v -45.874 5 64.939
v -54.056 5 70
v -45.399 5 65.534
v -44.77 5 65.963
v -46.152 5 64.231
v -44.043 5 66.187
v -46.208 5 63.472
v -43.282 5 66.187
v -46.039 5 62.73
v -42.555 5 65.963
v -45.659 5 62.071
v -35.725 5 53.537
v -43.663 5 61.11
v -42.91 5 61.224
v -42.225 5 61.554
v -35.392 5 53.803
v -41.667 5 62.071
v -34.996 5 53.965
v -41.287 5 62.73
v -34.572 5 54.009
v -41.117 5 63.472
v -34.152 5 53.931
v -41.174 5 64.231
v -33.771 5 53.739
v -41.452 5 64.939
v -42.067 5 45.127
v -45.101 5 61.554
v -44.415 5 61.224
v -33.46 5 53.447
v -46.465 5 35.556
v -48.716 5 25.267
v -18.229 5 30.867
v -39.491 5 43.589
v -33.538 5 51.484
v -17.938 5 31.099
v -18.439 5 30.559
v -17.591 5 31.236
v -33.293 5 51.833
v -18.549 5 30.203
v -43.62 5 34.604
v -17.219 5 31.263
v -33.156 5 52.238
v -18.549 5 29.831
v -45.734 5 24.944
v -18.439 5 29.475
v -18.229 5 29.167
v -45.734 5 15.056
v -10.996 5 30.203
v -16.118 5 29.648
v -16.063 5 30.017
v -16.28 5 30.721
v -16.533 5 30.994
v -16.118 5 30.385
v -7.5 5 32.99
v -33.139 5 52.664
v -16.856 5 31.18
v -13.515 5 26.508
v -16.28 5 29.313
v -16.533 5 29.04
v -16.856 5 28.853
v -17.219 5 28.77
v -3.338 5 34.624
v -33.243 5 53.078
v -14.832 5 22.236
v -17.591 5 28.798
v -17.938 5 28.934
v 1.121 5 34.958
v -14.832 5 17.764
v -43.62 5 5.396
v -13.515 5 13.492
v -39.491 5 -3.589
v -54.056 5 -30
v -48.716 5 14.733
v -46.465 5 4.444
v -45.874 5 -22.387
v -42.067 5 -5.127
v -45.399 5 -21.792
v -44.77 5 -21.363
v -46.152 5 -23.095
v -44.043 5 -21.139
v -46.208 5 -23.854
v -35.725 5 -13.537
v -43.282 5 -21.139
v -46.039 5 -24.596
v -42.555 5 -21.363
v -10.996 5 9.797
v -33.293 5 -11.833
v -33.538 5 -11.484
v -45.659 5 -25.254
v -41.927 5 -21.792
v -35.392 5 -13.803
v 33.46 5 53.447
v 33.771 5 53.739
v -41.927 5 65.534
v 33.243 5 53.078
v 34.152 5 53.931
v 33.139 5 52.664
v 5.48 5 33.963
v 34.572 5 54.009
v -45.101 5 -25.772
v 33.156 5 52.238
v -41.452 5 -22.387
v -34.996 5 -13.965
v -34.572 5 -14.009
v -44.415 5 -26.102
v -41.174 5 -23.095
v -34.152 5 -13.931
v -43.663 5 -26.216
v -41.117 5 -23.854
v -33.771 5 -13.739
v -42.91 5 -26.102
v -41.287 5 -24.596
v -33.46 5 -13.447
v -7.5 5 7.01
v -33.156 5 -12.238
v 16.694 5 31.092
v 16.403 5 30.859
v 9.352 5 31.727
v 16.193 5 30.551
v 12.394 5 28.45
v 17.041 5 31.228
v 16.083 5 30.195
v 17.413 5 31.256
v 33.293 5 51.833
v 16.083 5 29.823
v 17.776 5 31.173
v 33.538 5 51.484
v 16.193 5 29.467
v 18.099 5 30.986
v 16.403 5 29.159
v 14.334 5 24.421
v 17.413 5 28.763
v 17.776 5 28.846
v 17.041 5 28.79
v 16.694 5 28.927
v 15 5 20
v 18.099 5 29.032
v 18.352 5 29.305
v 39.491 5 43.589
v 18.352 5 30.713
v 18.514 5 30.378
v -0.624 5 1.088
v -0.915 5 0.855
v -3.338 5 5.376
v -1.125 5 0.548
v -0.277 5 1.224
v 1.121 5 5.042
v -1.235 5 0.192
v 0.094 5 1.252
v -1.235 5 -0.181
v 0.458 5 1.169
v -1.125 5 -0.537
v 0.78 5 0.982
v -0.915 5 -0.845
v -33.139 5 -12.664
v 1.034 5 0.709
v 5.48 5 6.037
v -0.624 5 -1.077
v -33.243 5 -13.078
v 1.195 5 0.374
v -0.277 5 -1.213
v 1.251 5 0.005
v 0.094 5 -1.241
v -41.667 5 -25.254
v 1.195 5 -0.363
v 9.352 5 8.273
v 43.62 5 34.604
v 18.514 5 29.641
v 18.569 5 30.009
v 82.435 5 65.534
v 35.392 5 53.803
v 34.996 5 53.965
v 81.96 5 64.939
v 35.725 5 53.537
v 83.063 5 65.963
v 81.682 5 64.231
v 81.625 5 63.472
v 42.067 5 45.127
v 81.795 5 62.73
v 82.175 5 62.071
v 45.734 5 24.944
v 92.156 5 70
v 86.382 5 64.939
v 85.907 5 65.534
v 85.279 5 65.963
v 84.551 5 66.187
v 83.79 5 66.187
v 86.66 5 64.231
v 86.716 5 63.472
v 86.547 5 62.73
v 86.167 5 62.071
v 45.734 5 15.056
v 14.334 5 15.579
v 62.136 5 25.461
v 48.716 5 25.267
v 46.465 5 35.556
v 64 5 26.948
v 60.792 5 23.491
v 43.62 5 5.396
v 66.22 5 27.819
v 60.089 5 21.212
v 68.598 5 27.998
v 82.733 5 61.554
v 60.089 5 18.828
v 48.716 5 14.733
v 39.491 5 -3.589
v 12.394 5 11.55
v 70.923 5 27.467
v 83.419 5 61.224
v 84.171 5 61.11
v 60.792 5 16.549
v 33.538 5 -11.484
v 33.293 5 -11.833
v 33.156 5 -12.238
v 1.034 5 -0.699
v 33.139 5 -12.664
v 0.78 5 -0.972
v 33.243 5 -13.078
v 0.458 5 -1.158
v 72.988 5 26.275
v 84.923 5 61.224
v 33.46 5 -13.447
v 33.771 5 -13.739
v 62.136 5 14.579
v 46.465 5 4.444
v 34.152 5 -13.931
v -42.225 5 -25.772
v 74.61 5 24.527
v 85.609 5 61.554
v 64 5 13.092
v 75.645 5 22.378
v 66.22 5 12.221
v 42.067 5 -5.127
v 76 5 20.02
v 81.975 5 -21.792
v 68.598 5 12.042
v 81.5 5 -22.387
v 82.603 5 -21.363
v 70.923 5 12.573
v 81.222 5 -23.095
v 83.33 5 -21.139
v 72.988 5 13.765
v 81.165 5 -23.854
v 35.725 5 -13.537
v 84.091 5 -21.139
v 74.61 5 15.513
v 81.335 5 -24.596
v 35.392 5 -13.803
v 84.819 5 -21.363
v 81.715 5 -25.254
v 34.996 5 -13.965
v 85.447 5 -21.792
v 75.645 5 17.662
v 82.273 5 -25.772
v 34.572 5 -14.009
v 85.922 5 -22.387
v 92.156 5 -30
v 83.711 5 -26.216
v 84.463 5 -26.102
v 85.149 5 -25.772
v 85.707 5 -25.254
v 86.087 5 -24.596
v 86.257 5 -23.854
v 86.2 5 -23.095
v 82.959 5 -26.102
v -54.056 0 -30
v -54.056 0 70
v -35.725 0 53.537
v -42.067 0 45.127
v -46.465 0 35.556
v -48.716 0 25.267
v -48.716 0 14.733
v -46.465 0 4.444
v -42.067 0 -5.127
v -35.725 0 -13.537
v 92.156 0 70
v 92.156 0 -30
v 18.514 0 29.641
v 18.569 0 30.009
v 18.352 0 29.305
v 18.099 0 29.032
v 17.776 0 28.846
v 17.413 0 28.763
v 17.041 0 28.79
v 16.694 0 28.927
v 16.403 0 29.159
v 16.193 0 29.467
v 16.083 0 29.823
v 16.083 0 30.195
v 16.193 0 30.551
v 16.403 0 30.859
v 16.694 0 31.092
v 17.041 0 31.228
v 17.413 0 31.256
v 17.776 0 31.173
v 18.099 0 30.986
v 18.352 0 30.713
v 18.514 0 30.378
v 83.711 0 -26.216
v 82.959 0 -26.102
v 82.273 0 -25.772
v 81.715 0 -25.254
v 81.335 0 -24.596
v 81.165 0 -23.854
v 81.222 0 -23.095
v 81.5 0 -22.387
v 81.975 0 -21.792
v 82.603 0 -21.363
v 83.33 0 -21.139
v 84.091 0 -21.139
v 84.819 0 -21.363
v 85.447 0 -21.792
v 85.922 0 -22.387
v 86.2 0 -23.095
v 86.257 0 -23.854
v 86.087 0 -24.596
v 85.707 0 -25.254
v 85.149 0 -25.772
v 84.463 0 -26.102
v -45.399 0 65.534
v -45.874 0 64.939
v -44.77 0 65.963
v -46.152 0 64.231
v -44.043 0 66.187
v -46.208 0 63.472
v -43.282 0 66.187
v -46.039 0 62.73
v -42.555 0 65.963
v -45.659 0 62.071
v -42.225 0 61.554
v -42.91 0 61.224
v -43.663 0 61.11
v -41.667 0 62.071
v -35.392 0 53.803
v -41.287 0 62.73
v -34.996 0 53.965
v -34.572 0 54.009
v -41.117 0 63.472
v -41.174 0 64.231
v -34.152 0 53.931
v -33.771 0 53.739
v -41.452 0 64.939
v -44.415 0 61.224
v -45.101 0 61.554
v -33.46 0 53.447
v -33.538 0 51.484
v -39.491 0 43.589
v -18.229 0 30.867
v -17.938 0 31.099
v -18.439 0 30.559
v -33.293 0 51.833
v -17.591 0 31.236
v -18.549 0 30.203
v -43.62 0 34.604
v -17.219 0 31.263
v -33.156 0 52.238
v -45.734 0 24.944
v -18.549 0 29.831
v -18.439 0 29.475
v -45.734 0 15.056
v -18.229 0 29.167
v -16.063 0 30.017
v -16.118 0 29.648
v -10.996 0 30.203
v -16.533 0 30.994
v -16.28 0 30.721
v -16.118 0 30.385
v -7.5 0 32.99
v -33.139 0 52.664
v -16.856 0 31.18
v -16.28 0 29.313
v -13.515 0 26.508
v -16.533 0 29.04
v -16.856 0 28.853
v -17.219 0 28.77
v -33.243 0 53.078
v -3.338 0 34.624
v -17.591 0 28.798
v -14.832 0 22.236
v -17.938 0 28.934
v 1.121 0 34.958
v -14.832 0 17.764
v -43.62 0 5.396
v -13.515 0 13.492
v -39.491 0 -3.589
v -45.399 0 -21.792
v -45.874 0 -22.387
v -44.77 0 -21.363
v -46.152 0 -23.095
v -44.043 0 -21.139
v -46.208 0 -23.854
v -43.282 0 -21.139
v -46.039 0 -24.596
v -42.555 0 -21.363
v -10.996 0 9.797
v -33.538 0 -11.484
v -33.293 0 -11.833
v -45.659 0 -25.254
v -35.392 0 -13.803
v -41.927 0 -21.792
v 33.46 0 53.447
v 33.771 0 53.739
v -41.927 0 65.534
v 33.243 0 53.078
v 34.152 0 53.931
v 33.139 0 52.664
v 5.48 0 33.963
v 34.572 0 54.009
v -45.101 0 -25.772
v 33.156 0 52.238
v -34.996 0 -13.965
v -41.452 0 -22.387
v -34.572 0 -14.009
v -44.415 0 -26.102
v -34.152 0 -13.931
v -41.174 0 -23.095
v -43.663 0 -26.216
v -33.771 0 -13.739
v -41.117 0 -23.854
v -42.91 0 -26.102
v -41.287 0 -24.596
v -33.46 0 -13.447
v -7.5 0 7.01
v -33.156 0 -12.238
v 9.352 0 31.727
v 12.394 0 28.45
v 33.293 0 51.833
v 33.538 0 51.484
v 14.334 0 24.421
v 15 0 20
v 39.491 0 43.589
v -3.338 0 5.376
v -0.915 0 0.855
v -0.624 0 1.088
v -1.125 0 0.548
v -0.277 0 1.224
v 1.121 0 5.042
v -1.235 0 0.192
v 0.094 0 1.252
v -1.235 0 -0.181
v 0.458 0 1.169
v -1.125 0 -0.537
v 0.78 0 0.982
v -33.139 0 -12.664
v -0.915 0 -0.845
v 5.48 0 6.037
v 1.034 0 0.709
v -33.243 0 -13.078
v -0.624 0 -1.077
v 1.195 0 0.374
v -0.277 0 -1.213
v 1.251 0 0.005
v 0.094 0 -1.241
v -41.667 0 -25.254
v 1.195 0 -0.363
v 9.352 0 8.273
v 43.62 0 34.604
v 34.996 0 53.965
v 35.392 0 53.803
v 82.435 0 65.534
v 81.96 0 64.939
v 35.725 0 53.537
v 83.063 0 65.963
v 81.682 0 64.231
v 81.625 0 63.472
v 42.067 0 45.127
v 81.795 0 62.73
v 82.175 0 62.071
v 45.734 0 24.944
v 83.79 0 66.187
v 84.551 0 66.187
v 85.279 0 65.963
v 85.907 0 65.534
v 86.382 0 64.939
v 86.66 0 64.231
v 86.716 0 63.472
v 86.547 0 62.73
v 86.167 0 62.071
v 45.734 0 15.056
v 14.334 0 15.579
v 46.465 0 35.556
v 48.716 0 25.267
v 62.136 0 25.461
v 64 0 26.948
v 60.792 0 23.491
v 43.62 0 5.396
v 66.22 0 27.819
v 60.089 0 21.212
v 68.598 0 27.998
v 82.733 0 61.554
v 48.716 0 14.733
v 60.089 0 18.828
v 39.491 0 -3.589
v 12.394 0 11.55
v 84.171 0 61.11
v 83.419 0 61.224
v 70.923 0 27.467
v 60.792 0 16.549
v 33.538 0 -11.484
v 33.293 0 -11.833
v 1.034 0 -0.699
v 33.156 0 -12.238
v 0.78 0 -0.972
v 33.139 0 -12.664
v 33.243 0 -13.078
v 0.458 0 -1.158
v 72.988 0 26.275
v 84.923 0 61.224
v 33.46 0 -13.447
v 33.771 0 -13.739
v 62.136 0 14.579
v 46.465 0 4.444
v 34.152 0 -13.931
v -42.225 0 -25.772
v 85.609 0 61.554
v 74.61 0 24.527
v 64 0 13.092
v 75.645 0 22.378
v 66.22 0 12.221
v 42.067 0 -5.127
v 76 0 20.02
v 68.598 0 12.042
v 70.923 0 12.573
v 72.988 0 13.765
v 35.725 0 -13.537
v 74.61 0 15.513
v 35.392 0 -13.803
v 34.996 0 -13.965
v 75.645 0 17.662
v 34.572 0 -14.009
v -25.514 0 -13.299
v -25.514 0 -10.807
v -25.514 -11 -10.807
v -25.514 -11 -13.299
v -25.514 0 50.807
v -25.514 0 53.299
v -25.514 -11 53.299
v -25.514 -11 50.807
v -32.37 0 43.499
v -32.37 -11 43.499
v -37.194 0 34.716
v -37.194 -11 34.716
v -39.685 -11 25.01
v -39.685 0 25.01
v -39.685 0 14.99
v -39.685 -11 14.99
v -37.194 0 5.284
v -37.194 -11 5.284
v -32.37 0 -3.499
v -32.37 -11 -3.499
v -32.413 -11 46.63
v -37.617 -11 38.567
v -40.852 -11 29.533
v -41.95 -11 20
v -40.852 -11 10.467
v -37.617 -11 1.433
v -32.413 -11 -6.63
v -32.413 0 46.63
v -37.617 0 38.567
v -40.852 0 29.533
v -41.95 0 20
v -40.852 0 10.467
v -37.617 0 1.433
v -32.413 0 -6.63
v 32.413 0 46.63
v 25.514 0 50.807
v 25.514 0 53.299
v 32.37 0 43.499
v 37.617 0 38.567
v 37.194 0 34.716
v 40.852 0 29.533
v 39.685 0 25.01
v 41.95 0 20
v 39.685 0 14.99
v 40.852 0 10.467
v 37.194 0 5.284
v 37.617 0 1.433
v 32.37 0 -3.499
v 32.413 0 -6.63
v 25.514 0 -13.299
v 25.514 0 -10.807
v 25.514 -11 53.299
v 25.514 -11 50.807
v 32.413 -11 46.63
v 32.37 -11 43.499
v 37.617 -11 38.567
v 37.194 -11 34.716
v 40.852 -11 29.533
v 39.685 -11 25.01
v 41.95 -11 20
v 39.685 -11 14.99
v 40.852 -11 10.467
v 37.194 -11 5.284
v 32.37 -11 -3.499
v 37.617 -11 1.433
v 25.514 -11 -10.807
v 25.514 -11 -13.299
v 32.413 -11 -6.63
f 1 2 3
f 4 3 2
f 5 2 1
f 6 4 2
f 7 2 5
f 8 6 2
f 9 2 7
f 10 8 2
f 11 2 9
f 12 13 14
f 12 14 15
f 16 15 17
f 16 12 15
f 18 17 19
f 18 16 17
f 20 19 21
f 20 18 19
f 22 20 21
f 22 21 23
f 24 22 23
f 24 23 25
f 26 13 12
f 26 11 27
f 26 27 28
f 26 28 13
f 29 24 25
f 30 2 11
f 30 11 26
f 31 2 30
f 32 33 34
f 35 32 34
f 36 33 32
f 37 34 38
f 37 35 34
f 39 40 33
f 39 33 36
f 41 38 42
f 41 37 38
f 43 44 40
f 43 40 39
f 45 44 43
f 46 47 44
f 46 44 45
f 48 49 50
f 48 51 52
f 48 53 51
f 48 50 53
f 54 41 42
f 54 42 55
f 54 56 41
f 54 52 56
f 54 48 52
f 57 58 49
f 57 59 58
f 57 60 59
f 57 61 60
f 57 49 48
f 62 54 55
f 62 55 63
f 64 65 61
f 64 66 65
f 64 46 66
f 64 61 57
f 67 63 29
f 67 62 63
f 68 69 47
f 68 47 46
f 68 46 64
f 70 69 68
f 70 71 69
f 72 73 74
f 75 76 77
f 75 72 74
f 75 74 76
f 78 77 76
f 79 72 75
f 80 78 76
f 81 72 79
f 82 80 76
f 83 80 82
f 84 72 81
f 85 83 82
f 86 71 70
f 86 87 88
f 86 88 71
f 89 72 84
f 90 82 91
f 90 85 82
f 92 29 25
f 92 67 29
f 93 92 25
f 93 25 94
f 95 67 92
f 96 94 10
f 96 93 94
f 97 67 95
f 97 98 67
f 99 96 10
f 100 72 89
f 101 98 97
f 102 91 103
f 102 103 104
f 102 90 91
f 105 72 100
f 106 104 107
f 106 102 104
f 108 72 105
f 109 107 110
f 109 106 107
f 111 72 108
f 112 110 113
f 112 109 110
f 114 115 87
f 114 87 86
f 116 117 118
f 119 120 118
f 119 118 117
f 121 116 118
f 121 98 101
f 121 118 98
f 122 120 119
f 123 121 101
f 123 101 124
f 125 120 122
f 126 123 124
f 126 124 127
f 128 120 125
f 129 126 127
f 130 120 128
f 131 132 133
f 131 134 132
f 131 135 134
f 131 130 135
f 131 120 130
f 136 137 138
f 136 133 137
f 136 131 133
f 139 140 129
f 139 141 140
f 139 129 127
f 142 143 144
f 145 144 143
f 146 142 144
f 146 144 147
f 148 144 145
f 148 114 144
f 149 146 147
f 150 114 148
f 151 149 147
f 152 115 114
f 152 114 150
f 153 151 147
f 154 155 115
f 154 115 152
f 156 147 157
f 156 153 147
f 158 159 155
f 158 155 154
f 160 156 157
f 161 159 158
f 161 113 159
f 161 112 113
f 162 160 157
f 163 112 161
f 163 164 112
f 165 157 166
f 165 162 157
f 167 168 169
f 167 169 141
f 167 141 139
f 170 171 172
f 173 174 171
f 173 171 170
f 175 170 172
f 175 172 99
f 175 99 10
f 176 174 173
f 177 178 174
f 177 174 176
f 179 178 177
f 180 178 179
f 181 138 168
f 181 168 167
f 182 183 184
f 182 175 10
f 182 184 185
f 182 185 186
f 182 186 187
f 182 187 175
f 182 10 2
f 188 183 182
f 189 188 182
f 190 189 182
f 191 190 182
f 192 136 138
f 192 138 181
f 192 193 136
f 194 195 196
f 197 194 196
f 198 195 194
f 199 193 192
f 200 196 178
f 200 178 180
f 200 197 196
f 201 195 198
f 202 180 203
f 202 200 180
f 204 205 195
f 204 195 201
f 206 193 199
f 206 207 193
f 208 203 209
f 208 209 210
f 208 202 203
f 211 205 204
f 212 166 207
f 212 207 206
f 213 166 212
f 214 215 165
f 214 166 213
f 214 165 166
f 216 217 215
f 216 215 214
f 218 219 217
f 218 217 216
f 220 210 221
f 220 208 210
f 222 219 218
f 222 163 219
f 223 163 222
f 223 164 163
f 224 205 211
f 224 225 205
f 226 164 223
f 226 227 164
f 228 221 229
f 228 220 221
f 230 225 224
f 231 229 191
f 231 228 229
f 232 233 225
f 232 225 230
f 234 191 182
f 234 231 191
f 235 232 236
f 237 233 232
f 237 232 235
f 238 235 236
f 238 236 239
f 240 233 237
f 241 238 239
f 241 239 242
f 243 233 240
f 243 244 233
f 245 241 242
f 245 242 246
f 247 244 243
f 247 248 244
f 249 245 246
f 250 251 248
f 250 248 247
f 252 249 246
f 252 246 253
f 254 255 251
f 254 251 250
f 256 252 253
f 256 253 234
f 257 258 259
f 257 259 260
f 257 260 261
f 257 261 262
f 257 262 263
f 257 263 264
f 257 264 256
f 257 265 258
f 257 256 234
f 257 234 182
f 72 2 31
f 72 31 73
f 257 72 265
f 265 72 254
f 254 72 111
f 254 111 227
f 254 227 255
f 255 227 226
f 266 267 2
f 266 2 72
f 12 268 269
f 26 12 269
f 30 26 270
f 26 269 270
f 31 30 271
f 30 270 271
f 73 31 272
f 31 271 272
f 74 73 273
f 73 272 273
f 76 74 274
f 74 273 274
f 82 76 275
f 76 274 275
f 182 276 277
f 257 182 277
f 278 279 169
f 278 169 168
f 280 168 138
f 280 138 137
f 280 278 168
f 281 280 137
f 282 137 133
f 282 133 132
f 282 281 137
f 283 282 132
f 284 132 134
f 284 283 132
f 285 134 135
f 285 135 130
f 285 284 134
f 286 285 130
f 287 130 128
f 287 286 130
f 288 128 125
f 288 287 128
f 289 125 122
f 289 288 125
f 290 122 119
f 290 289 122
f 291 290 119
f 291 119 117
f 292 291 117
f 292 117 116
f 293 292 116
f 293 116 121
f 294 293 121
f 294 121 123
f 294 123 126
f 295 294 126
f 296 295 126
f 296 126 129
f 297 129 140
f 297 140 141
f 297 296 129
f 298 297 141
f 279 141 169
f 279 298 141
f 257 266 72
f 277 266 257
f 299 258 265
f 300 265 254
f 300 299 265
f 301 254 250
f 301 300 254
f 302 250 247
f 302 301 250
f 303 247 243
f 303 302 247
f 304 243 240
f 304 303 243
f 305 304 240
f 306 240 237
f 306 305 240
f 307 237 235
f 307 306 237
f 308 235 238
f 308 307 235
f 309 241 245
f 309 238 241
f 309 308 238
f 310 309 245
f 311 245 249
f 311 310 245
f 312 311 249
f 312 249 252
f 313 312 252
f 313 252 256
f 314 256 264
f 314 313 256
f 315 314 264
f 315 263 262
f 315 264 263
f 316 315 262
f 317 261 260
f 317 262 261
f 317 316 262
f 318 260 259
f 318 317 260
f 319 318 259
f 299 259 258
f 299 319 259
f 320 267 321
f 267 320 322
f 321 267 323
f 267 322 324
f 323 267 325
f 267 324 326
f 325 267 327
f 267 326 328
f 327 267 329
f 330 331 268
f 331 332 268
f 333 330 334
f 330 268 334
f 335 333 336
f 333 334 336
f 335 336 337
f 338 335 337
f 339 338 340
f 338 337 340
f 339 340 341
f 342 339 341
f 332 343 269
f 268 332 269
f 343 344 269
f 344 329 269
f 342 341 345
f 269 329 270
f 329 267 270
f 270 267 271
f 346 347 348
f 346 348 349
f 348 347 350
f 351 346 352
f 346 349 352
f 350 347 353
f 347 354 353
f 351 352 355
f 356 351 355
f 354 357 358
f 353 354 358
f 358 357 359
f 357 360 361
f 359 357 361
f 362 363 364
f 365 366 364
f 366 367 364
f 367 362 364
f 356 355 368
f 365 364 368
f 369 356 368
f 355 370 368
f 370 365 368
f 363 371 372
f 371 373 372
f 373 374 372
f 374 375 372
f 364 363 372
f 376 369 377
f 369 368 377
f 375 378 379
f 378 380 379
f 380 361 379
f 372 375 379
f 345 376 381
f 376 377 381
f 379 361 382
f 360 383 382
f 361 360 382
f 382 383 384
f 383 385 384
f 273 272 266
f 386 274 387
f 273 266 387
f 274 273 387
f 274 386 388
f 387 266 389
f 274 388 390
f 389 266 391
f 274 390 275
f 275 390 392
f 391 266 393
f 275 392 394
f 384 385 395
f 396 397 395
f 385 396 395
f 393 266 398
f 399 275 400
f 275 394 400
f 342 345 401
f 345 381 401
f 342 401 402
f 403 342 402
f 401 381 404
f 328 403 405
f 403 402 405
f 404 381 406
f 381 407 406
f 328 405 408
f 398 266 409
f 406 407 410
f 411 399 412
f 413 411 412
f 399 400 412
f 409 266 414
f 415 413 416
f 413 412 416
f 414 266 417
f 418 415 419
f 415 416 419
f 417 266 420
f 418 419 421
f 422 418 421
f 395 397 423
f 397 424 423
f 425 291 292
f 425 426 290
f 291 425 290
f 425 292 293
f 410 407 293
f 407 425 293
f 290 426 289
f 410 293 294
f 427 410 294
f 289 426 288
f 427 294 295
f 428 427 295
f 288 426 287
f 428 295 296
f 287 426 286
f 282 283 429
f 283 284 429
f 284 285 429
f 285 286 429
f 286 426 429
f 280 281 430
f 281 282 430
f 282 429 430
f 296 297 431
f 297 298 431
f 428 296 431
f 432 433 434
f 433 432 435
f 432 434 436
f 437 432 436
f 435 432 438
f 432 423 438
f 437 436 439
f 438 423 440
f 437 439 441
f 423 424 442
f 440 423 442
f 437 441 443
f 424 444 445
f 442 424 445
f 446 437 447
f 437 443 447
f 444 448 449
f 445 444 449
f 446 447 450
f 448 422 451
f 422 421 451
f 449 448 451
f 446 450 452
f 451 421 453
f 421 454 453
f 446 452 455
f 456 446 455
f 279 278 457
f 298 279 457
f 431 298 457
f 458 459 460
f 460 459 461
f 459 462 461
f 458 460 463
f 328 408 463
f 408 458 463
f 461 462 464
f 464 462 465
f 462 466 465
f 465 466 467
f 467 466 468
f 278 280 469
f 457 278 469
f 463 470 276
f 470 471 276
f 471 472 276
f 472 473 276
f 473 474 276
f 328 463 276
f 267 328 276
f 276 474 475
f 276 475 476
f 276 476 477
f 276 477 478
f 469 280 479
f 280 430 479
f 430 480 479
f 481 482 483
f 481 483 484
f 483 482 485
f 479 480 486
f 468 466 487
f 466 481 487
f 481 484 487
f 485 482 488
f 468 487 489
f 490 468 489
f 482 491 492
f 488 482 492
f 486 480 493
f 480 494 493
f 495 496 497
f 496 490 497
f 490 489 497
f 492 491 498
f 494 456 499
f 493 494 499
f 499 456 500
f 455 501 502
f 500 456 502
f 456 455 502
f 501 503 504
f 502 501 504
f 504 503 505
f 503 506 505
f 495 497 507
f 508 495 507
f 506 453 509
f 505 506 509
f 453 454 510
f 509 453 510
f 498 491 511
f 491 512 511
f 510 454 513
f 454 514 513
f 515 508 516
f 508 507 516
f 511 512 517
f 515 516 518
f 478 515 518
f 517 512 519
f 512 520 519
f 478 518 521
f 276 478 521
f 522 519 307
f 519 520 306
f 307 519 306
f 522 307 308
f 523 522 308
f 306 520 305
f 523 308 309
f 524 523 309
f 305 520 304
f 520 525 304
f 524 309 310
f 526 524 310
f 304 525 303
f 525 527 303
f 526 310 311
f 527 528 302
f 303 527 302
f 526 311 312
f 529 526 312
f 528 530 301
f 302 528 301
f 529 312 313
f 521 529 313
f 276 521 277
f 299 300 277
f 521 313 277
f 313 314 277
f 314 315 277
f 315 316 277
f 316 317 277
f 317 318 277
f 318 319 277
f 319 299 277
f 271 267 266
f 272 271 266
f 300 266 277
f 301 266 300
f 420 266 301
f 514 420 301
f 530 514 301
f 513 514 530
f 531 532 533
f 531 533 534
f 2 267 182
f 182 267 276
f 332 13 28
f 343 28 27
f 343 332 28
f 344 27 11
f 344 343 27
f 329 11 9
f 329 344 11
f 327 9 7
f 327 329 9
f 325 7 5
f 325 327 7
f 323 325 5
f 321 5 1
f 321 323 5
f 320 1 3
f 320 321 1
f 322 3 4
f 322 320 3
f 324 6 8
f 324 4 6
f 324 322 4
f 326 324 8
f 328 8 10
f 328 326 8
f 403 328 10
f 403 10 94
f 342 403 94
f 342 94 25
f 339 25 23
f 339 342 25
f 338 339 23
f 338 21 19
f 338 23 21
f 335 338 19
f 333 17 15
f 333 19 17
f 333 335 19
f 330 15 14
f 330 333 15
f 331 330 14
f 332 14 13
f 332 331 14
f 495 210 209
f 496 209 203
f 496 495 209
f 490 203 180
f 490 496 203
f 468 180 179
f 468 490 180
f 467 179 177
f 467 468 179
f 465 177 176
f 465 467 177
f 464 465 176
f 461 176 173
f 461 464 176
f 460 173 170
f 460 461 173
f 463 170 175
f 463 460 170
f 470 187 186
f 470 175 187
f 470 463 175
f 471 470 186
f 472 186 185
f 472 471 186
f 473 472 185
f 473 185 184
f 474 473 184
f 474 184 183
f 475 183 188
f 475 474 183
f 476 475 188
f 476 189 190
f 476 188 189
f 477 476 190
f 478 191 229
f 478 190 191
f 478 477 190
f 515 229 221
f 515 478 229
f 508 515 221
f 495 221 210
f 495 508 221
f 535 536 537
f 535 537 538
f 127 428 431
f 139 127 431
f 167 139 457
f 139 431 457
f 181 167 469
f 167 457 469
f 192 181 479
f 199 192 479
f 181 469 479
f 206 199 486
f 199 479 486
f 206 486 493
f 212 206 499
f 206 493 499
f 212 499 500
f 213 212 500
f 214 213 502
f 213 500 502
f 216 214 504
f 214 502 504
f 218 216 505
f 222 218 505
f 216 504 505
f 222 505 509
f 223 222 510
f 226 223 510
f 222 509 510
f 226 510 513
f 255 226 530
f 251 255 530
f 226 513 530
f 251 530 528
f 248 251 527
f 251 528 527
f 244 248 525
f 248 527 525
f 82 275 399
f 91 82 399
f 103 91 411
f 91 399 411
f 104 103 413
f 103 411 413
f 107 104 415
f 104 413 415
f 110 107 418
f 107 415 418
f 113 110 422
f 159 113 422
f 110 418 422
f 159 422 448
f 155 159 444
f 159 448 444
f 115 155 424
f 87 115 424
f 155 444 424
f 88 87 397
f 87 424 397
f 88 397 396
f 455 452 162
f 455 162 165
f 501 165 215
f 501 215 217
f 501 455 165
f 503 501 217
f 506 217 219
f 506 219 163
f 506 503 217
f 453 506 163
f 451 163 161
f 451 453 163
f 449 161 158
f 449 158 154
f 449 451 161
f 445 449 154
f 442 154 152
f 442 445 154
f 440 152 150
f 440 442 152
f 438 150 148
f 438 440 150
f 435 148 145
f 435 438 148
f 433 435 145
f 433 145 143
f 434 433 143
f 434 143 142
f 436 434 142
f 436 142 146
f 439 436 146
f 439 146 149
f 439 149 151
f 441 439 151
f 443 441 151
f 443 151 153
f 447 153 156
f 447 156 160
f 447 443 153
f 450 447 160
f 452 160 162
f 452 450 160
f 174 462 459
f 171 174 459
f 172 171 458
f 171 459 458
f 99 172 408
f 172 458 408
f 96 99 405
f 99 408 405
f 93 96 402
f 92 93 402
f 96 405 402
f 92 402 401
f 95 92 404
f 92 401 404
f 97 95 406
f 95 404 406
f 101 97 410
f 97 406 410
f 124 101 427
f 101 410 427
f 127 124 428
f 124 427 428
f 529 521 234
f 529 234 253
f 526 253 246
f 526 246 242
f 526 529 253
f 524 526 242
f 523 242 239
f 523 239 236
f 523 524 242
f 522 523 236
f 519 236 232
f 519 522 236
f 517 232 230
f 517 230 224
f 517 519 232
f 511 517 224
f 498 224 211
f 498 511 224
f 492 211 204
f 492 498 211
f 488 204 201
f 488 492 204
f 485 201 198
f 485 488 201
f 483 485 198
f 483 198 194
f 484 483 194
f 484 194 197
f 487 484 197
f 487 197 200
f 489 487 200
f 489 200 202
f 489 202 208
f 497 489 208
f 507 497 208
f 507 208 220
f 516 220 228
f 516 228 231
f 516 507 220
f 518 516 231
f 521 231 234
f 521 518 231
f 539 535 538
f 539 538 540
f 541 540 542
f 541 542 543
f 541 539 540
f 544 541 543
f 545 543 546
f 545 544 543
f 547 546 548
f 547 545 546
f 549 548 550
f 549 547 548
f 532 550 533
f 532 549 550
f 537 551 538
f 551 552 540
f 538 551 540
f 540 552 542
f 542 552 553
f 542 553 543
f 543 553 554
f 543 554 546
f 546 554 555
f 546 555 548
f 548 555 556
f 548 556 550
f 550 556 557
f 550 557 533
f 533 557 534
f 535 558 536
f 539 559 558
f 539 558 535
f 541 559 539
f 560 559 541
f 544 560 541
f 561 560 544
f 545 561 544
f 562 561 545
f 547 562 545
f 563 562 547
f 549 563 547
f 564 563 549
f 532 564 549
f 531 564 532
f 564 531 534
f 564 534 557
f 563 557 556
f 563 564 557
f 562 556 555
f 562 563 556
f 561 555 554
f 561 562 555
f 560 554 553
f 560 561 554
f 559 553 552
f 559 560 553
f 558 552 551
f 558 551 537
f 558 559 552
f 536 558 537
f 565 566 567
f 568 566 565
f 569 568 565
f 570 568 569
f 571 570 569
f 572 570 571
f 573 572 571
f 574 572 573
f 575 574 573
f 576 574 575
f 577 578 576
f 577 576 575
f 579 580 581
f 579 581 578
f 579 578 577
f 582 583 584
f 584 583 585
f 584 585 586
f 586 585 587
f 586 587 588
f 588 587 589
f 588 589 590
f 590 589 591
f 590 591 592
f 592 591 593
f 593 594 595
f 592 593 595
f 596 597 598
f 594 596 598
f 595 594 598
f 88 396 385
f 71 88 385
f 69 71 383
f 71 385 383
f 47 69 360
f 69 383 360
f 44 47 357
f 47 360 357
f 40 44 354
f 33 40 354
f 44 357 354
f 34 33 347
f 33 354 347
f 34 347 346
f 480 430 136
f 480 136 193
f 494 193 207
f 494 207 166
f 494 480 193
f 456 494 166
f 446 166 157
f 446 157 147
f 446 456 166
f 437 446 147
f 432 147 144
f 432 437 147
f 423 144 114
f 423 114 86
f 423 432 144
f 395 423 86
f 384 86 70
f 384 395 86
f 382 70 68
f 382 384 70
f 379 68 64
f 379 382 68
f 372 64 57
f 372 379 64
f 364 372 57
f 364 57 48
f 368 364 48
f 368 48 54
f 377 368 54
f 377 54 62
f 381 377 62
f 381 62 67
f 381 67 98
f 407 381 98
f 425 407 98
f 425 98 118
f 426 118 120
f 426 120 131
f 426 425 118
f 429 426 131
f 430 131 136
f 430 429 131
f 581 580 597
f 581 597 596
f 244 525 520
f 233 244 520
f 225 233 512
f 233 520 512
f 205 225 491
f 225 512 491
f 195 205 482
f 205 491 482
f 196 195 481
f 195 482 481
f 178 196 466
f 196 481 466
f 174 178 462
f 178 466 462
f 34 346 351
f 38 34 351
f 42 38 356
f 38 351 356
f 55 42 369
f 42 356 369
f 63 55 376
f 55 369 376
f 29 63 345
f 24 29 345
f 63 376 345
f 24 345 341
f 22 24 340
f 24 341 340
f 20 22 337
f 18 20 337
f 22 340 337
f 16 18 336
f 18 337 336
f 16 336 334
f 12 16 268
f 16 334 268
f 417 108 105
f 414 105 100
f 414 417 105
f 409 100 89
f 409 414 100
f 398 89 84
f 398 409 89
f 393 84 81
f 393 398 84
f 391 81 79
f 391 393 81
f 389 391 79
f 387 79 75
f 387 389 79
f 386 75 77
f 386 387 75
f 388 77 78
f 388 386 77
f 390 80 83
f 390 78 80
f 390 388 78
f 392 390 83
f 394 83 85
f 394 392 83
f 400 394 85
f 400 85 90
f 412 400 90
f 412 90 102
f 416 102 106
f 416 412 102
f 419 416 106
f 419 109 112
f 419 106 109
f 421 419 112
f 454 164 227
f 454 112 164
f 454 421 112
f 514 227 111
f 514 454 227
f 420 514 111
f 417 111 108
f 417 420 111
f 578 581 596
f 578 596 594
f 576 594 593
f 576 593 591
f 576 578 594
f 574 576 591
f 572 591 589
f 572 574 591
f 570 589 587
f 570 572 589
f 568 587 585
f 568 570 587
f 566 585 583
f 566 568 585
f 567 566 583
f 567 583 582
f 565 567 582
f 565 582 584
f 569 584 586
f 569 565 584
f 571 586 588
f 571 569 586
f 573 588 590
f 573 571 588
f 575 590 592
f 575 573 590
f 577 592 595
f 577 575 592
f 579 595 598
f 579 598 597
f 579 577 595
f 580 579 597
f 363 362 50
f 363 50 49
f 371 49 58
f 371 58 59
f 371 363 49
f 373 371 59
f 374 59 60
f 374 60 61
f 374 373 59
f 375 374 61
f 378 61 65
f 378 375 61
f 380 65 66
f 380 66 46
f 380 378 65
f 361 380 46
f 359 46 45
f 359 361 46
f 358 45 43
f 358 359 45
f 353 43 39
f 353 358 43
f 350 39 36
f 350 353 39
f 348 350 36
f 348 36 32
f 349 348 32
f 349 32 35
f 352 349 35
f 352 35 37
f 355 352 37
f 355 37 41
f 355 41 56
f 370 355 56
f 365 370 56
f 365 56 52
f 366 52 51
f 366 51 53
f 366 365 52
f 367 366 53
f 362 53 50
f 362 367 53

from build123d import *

# Parameters (mm, degrees)
SKETCH1_W                            = 146.211089784
SKETCH1_H                            = 100
SKETCH1_R                            = 1.25
SKETCH1_R_2                          = 8
SKETCH1_R_3                          = 15
BOSS_EXTRUDE1_DEPTH                  = 5
BOSS_EXTRUDE4_DEPTH                  = 11
BOSS_EXTRUDE4_2_DEPTH                = 11
TAP_DRILL_FOR_1_4_20_TAP1_AT_2_COUNT = 2
TAP_DRILL_FOR_1_4_20_TAP1_AT_2_PITCH = 87.325808516
TAP_DRILL_FOR_1_4_20_TAP1_AT_3_COUNT = 2
TAP_DRILL_FOR_1_4_20_TAP1_AT_3_PITCH = 154.434105625
TAP_DRILL_FOR_1_4_20_TAP1_AT_4_COUNT = 2
TAP_DRILL_FOR_1_4_20_TAP1_AT_4_PITCH = 127.833840476


with BuildPart() as part:
    # Sketch1 → Boss-Extrude1 (new body)
    with BuildSketch(Plane(origin=(0, 0, 0), x_dir=(1, 0, 0), z_dir=(0, 1, 0))):
        with Locations((19.05, -20)):
            Rectangle(SKETCH1_W, SKETCH1_H)
        with Locations((-17.312758334, -30.016899554)):
            Circle(SKETCH1_R, mode=Mode.SUBTRACT)
        with Locations((17.319248736, -30.009097211)):
            Circle(SKETCH1_R, mode=Mode.SUBTRACT)
        with Locations((67.999997057, -20.020005506)):
            Circle(SKETCH1_R_2, mode=Mode.SUBTRACT)
        with BuildLine():
            ThreePointArc((-33.537855017, 11.483523958), (-46, -19.999999986), (-33.537855037, -51.483523937))
            ThreePointArc((-33.537855037, -51.483523937), (-33.604844238, -53.603786249), (-35.725106552, -53.536797132))
            ThreePointArc((-35.725106552, -53.536797132), (-49, -19.99999995), (-35.725106483, 13.536797205))
            ThreePointArc((-35.725106483, 13.536797205), (-33.604844212, 13.603786224), (-33.537855017, 11.483523958))
        make_face(mode=Mode.SUBTRACT)
        with Locations((0, -20)):
            Circle(SKETCH1_R_3, mode=Mode.SUBTRACT)
        with Locations((0.000990516, -0.005201359)):
            Circle(SKETCH1_R, mode=Mode.SUBTRACT)
        with BuildLine():
            ThreePointArc((33.537855023, 11.483523952), (33.604844233, 13.603786244), (35.725106529, 13.536797156))
            ThreePointArc((35.725106529, 13.536797156), (49, -19.999999991), (35.725106542, -53.536797143))
            ThreePointArc((35.725106542, -53.536797143), (33.604844119, -53.603786137), (33.537855251, -51.48352371))
            ThreePointArc((33.537855251, -51.48352371), (46, -19.999999834), (33.537855023, 11.483523952))
        make_face(mode=Mode.SUBTRACT)
    extrude(amount=BOSS_EXTRUDE1_DEPTH)

    # Sketch3 → Tap Drill for 1/4-20 Tap1 (revolve, cut)
    with BuildSketch(Plane(origin=(-43.662904258, 0, 63.662904258), x_dir=(0, 0, -1), z_dir=(1, 0, 0))):
        Polygon((0, 0), (0, 26.933816902), (2.5527, 25.4), (2.5527, 0), align=None)
    tap_drill_for_1_4_20_tap1 = revolve(axis=Axis((-43.662904258, -6.35, 63.662904258), (0, 1, 0)), mode=Mode.SUBTRACT)

    # Tap Drill for 1/4-20 Tap1 at 2: Tap Drill for 1/4-20 Tap1 ×2
    with Locations(*[(0, 0, -i * TAP_DRILL_FOR_1_4_20_TAP1_AT_2_PITCH) for i in range(1, TAP_DRILL_FOR_1_4_20_TAP1_AT_2_COUNT)]):
        add(tap_drill_for_1_4_20_tap1, mode=Mode.SUBTRACT)

    # Tap Drill for 1/4-20 Tap1 at 3: Tap Drill for 1/4-20 Tap1 ×2
    with Locations(*[Vector(0.824777944, 0, -0.565456757) * (i * TAP_DRILL_FOR_1_4_20_TAP1_AT_3_PITCH) for i in range(1, TAP_DRILL_FOR_1_4_20_TAP1_AT_3_COUNT)]):
        add(tap_drill_for_1_4_20_tap1, mode=Mode.SUBTRACT)

    # Tap Drill for 1/4-20 Tap1 at 4: Tap Drill for 1/4-20 Tap1 ×2
    with Locations(*[(i * TAP_DRILL_FOR_1_4_20_TAP1_AT_4_PITCH, 0, 0) for i in range(1, TAP_DRILL_FOR_1_4_20_TAP1_AT_4_COUNT)]):
        add(tap_drill_for_1_4_20_tap1, mode=Mode.SUBTRACT)


with BuildPart() as body_2:
    # Sketch1<4> → Boss-Extrude4 (new body)
    with BuildSketch(Plane(origin=(0, 0, 0), x_dir=(1, 0, 0), z_dir=(0, 1, 0))):
        with BuildLine():
            ThreePointArc((-25.513706898, 13.299448349), (-41.95, -20), (-25.513706898, -53.299448349))
            Line((-25.513706898, -53.299448349), (-25.513706898, -50.806667477))
            ThreePointArc((-25.513706898, -50.806667477), (-40.000000009, -20), (-25.513706898, 10.806667477))
            Line((-25.513706898, 10.806667477), (-25.513706898, 13.299448349))
        make_face()
    extrude(amount=-BOSS_EXTRUDE4_DEPTH)


with BuildPart() as body_3:
    # Sketch1<4> → Boss-Extrude4 2 (new body)
    with BuildSketch(Plane(origin=(0, 0, 0), x_dir=(1, 0, 0), z_dir=(0, 1, 0))):
        with BuildLine():
            Line((25.513706898, -50.806667477), (25.513706898, -53.299448349))
            ThreePointArc((25.513706898, -53.299448349), (41.95, -20), (25.513706898, 13.299448349))
            Line((25.513706898, 13.299448349), (25.513706898, 10.806667477))
            ThreePointArc((25.513706898, 10.806667477), (40.000000009, -20), (25.513706898, -50.806667477))
        make_face()
    extrude(amount=-BOSS_EXTRUDE4_2_DEPTH)


solid = Compound([part.part, body_2.part, body_3.part])
